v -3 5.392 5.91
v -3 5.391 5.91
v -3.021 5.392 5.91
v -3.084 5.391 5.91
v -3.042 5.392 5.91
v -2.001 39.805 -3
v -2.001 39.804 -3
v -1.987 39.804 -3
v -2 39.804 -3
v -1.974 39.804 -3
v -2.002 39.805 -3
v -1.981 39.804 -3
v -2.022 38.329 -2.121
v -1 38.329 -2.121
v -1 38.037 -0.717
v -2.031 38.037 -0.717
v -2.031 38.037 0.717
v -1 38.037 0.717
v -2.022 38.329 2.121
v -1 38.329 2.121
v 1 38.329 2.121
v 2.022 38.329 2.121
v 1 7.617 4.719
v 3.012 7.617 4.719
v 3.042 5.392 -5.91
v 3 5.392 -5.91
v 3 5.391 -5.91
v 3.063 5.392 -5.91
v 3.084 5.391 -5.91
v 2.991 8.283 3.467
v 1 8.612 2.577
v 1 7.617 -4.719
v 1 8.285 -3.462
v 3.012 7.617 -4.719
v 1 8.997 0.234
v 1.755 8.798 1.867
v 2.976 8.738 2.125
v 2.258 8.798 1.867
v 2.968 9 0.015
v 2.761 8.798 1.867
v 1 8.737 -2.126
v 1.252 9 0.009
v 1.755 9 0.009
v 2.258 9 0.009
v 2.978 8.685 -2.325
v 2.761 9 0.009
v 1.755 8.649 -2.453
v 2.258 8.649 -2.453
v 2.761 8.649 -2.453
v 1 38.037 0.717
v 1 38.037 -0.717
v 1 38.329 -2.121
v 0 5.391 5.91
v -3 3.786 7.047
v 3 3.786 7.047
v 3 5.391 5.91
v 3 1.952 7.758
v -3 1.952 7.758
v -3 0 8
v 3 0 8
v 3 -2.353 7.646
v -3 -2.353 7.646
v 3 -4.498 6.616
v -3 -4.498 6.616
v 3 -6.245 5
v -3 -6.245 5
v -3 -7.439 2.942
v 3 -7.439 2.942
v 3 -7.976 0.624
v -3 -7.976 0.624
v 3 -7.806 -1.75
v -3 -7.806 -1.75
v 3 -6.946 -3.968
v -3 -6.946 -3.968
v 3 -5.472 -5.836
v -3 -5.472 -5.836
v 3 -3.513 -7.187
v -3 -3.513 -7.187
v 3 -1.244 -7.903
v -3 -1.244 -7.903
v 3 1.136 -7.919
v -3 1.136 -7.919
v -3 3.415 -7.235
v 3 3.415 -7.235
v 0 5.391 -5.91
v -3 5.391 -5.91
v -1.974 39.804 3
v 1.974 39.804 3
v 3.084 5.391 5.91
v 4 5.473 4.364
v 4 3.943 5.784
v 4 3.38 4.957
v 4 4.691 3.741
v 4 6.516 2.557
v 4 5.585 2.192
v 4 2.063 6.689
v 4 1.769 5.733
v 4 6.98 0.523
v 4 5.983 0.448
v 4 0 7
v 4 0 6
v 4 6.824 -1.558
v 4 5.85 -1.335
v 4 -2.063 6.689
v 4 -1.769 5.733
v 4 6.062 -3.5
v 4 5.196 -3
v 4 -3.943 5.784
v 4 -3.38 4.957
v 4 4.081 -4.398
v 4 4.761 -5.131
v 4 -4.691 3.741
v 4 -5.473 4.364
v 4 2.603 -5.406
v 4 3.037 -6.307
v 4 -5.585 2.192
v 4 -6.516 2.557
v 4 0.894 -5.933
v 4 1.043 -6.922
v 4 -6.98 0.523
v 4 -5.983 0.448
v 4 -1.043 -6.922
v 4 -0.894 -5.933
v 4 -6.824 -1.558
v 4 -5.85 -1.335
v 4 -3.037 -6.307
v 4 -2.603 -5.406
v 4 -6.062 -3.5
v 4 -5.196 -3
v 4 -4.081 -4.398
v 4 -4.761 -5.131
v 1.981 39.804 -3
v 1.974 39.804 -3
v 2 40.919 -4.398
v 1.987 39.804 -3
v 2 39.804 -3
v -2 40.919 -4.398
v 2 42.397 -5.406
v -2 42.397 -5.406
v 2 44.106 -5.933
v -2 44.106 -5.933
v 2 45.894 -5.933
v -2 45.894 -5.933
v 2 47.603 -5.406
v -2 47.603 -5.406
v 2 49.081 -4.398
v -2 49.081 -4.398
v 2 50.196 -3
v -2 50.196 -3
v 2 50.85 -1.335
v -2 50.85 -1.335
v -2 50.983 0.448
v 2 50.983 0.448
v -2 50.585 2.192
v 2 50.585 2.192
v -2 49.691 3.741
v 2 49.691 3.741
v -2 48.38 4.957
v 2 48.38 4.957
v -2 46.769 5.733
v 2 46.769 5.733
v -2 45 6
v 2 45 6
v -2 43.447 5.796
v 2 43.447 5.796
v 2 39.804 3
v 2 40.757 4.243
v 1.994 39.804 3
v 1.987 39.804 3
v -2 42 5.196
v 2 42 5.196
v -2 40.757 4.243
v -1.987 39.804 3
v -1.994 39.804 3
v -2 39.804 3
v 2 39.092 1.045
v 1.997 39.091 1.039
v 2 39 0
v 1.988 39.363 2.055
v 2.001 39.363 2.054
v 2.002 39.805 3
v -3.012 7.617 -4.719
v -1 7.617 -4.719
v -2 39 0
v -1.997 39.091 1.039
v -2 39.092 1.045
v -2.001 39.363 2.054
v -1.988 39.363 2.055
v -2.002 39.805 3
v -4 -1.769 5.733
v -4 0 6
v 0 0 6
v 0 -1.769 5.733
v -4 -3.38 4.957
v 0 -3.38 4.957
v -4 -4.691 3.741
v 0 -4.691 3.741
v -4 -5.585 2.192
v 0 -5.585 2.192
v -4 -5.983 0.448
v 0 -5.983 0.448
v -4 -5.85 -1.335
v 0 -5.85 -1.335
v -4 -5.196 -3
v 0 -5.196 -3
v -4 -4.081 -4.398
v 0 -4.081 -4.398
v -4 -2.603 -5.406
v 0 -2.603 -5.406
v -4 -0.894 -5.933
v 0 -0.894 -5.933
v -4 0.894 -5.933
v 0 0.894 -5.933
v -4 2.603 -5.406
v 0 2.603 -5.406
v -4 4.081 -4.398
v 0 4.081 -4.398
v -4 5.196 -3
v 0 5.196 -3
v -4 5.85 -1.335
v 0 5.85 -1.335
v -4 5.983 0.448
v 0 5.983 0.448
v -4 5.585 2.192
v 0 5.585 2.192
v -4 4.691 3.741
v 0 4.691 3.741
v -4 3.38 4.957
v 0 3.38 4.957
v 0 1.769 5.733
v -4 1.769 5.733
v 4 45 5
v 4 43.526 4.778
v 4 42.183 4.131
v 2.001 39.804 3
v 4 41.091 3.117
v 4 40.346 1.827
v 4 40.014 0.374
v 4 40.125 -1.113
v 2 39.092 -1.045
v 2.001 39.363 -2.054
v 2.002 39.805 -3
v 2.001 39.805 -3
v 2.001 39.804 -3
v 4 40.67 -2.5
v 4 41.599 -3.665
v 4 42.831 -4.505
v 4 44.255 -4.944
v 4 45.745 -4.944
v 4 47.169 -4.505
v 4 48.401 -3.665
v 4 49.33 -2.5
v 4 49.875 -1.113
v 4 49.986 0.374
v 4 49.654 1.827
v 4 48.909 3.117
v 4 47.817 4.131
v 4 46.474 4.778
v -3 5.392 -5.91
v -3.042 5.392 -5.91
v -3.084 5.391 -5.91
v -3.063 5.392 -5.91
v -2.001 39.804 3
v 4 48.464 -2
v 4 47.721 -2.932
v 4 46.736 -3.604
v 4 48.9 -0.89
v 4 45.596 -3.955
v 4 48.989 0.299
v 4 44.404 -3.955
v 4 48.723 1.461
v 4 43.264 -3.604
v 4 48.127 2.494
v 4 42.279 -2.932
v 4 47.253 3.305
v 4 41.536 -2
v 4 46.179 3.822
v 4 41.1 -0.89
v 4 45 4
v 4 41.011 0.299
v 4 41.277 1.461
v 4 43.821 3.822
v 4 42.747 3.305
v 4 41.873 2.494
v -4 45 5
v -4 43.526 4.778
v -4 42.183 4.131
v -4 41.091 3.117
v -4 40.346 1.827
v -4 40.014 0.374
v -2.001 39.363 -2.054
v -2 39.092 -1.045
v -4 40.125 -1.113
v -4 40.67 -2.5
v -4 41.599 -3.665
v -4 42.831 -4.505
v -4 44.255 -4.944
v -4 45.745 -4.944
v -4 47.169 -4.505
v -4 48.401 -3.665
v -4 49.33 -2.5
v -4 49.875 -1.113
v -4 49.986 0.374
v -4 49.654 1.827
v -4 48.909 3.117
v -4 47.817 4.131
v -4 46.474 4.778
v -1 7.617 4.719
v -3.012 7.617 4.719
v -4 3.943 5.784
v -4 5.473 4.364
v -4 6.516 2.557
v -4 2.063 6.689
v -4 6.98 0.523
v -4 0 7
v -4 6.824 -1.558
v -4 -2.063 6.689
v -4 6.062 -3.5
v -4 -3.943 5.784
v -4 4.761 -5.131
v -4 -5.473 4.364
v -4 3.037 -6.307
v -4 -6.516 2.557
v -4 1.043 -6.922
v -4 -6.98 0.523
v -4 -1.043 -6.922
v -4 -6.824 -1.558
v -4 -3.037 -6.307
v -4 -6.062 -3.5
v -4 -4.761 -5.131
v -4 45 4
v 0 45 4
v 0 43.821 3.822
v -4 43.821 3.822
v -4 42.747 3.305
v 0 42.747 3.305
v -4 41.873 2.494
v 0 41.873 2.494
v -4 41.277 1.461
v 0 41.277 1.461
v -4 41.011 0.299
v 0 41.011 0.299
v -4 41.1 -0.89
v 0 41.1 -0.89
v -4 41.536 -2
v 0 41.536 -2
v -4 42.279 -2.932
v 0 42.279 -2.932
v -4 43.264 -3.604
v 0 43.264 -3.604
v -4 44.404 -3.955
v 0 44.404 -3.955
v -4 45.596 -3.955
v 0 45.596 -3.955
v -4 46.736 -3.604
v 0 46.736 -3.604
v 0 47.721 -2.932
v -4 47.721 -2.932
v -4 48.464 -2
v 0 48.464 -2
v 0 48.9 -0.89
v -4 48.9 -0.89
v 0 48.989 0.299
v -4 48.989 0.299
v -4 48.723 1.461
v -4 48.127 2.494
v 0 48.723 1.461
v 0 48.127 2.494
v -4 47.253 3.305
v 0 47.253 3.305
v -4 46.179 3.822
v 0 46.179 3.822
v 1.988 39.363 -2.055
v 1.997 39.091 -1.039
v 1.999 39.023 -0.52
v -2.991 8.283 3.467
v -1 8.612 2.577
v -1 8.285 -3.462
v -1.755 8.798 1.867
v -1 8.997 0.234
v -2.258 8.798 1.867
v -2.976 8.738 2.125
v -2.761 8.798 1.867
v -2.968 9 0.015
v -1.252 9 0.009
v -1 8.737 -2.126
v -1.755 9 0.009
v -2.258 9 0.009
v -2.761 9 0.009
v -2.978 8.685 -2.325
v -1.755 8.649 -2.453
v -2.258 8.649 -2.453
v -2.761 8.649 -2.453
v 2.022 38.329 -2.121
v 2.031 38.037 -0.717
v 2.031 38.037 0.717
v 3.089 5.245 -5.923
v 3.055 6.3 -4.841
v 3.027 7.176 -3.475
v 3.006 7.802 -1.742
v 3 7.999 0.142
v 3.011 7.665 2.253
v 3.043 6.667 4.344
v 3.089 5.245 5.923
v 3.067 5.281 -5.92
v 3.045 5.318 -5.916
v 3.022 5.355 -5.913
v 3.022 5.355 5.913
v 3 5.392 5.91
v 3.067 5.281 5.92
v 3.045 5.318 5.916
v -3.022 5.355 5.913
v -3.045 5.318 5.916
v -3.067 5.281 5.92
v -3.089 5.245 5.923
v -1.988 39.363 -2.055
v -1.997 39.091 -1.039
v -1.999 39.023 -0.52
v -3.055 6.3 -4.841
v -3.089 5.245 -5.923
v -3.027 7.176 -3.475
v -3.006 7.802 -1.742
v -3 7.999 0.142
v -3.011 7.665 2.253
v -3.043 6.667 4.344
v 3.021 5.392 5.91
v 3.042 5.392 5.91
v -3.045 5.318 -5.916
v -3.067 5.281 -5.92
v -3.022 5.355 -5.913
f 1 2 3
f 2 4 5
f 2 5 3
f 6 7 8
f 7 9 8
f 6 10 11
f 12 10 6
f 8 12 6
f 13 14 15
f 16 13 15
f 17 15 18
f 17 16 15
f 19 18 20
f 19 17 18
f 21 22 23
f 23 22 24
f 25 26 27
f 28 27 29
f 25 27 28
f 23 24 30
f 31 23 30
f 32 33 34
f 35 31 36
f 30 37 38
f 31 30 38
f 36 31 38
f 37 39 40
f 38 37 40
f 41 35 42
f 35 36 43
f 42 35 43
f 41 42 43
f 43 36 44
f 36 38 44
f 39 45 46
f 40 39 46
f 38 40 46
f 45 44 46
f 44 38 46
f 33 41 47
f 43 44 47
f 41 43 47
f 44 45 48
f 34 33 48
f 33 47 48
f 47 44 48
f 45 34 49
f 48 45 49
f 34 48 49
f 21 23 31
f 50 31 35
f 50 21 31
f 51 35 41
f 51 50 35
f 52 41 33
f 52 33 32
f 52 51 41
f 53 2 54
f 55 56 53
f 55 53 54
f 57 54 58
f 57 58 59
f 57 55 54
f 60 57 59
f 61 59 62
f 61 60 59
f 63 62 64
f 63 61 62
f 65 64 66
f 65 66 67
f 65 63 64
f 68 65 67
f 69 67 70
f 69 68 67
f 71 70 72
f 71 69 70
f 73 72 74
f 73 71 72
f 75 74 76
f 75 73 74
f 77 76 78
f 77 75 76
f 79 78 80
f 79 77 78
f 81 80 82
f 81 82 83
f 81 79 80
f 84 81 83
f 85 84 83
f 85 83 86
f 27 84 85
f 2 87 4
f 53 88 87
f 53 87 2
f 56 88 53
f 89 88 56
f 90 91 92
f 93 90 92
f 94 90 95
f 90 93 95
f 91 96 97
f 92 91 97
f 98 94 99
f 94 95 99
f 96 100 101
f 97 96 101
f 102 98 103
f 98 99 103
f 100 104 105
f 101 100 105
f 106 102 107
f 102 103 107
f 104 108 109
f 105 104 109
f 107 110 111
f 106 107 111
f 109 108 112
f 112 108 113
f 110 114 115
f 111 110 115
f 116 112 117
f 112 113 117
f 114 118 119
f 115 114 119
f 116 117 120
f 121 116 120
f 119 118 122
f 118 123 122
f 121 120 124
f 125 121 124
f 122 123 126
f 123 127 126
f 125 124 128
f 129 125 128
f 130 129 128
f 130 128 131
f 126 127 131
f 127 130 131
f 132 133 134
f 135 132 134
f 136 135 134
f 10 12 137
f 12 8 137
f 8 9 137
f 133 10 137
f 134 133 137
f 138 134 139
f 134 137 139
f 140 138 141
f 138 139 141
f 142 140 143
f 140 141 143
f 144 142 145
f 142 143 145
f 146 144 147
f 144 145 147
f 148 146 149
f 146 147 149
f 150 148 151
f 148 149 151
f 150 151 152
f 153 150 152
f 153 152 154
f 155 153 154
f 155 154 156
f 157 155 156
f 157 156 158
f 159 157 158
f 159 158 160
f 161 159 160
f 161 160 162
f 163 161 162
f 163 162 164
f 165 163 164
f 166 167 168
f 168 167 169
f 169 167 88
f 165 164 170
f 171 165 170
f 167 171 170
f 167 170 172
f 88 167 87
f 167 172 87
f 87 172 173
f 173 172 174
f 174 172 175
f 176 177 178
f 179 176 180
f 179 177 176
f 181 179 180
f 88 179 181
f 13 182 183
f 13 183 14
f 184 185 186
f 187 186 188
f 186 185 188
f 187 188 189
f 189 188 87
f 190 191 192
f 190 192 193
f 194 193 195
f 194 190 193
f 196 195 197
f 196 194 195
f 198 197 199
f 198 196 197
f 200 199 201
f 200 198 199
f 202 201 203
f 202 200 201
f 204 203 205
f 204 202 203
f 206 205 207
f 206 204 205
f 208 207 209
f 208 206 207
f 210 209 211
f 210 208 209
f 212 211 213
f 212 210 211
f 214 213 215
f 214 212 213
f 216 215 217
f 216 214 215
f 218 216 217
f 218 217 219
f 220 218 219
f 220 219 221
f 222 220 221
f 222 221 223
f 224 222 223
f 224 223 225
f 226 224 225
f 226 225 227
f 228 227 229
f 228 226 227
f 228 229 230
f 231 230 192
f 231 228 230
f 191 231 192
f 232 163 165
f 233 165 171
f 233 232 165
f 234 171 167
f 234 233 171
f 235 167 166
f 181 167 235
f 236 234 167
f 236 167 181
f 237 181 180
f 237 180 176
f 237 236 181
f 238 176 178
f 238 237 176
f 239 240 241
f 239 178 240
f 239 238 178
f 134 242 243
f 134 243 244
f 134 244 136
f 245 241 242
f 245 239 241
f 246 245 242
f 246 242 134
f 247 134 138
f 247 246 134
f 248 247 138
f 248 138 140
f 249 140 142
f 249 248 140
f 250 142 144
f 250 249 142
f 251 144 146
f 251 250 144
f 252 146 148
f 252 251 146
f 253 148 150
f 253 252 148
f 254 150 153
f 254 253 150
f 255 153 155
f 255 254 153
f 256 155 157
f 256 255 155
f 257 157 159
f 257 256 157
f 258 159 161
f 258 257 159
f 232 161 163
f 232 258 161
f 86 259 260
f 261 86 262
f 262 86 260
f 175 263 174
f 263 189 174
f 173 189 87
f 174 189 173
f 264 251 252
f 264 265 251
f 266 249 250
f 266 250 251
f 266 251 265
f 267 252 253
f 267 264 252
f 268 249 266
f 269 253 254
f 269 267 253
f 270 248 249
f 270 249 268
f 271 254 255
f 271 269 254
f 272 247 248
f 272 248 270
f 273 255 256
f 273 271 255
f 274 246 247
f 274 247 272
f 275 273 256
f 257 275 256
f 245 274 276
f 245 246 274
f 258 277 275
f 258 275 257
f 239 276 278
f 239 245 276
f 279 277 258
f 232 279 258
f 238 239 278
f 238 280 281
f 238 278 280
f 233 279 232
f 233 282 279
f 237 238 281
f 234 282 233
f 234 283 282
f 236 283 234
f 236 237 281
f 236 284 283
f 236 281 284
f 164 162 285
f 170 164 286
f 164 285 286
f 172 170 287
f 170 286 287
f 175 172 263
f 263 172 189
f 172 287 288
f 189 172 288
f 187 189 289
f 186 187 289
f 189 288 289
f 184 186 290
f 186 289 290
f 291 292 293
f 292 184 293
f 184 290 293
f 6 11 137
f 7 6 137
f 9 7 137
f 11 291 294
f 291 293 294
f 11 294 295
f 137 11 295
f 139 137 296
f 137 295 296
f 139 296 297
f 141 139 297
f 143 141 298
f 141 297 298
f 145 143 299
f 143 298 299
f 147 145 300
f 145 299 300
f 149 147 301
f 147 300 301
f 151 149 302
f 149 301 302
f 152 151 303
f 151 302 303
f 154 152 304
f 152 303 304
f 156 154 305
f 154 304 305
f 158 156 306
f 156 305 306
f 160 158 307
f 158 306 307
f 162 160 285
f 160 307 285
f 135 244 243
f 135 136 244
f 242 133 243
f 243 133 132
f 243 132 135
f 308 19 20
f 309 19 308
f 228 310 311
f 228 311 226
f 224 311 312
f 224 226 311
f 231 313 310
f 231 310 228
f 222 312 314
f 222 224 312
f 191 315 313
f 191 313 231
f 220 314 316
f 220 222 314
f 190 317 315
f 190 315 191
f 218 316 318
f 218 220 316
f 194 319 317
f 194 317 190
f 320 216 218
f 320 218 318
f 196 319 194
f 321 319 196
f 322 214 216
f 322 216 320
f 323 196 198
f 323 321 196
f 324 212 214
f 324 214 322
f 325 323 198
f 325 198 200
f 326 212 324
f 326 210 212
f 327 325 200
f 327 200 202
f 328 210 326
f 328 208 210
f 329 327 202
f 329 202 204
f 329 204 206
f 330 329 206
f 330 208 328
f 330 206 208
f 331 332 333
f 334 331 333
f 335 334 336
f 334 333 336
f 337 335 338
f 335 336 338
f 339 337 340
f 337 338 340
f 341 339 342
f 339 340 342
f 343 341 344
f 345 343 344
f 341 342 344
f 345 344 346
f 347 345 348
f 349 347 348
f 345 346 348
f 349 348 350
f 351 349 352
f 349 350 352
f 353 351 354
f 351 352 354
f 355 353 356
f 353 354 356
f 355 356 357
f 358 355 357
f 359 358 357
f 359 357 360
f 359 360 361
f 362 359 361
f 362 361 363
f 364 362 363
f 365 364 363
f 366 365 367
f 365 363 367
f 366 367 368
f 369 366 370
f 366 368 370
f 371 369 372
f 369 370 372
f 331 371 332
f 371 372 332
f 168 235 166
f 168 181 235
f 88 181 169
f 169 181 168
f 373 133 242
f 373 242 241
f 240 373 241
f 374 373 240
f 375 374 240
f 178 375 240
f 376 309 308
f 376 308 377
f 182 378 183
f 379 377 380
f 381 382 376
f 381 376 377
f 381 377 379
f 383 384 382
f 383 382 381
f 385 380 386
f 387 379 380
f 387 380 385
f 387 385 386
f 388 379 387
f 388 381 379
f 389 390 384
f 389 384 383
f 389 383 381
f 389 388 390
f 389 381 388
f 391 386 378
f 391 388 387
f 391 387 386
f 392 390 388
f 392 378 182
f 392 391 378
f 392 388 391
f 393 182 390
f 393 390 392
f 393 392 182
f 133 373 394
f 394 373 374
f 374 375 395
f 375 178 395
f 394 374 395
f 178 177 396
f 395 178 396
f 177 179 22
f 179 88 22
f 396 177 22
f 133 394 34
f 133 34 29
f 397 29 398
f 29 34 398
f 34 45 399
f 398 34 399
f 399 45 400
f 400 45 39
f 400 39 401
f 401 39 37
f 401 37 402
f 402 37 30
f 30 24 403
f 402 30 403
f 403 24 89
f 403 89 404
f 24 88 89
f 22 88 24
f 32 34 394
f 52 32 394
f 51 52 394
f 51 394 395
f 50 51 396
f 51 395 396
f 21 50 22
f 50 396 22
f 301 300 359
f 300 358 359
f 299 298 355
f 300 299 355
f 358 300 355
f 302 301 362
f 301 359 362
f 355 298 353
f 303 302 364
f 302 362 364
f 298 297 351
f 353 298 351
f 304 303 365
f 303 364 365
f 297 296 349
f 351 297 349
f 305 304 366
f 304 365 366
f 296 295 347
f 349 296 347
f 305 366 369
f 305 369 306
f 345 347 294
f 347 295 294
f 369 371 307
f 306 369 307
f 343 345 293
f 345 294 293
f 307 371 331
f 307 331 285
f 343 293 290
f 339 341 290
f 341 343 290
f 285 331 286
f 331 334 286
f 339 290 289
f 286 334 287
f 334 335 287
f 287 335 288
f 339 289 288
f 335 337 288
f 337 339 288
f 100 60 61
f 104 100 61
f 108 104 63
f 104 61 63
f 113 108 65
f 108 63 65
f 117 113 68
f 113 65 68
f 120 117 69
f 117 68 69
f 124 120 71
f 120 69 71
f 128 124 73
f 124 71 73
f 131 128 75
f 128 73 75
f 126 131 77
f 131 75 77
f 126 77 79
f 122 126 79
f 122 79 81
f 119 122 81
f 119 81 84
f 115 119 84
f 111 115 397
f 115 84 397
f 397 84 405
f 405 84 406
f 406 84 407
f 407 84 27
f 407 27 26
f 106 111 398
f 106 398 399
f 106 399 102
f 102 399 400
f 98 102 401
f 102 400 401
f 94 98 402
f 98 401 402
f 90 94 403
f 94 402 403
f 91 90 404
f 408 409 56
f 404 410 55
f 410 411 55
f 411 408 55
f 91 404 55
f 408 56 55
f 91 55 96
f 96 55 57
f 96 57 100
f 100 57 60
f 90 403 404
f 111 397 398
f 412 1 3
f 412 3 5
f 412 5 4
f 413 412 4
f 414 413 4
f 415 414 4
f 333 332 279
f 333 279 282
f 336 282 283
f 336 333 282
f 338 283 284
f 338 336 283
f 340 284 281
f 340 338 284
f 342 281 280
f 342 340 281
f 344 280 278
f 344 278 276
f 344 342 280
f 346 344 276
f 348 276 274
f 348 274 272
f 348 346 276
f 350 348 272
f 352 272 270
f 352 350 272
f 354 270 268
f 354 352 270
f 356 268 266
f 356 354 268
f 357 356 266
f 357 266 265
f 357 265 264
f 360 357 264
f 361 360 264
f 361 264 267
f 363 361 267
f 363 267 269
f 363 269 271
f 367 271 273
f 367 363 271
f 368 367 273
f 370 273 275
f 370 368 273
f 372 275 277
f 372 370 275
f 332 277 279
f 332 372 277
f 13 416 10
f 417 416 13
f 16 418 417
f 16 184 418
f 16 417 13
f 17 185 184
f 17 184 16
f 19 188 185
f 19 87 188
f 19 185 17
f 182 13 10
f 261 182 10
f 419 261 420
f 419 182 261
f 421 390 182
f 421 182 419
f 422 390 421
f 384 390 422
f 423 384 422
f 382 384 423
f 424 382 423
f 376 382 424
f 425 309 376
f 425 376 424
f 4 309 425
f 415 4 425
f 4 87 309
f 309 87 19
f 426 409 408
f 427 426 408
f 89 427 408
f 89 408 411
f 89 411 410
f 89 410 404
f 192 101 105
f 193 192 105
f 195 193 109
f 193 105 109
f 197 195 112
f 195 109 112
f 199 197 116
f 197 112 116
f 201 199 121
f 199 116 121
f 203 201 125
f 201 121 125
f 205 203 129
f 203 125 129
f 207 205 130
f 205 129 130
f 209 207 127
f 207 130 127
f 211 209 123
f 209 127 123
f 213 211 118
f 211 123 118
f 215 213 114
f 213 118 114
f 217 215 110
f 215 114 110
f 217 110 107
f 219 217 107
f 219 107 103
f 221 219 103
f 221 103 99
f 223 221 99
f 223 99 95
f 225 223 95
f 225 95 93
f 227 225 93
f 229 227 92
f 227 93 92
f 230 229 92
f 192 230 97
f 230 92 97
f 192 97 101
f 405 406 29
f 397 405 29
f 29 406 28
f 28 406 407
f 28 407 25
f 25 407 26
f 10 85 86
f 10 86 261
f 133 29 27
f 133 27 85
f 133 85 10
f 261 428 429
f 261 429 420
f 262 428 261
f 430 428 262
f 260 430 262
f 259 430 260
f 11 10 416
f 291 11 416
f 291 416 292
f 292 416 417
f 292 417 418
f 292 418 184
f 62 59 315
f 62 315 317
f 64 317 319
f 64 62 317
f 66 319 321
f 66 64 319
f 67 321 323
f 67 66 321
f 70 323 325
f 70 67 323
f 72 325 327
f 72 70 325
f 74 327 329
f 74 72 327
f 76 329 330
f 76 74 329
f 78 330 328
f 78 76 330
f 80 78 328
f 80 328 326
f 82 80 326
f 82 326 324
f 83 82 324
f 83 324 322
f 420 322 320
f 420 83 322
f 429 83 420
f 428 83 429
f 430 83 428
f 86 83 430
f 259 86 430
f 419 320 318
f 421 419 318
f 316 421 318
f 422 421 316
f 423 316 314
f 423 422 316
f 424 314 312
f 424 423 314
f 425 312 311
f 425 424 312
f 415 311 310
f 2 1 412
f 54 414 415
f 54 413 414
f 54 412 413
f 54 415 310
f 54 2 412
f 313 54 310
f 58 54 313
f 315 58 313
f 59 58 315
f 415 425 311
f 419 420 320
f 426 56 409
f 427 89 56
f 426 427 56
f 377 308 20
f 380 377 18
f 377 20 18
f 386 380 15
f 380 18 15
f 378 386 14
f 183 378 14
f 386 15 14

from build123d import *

# Parameters (mm, degrees)
BOSS_EXTRU_1_START      = -2.0000001
BOSS_EXTRU_1_DEPTH      = 2.0000001
BOSS_EXTRU_1_START_2    = 2.0000001
BOSS_EXTRU_1_2_DEPTH    = 1.088880676
BOSS_EXTRU_1_START_3    = 3.256370695
BOSS_EXTRU_1_3_DEPTH    = 1.743629305
BOSS_EXTRU_1_START_4    = 3.172268194
BOSS_EXTRU_1_4_DEPTH    = 0.084102501
ENL_V_MAT_EXTRU_1_DEPTH = 9


with BuildPart() as part:
    # Esquisse2 → Révolution1 (revolve)
    with BuildSketch(Plane.XY, mode=Mode.PRIVATE) as r_volution1_sk:
        Polygon((2.4e-16, 6), (4, 6), (4, 7), (2.9999999999999996, 8), (-1.8e-16, 8), align=None)
    revolve(r_volution1_sk.sketch.rotate(Axis((0, 0, 0), (1, 0, 0)), 90), axis=Axis((0, 0, 0), (1, 0, 0)))



with BuildPart() as body_2:
    # Esquisse3 → Révolution2 (revolve)
    with BuildSketch(Plane.XY, mode=Mode.PRIVATE) as r_volution2_sk:
        Polygon((0, 48.99999999999999), (4.01e-15, 51), (2, 51), (4, 49.99999999999999), (4, 48.99999999999999), align=None)
    revolve(r_volution2_sk.sketch.rotate(Axis((0, 45, 0), (1, 0, 0)), 90), axis=Axis((0, 45, 0), (1, 0, 0)))


with BuildPart() as part_1:
    add(part.part)

    add(body_2.part)  # Boss.-Extru.1 merges body 2
    # Boss.-Extru.1: read off the stored shape, not the designer's step
    # Boss.-Extru.1 outline → Boss.-Extru.1 (add)
    with BuildSketch(Plane.ZY.offset(BOSS_EXTRU_1_START)):
        with BuildLine():
            ThreePointArc((-5.910337632, 5.39146632), (0, 8), (5.910337632, 5.39146632))
            Line((5.910337632, 5.39146632), (3, 39.803847577))
            ThreePointArc((3, 39.803847577), (0, 39), (-3, 39.803847577))
            Line((-3, 39.803847577), (-5.910337632, 5.39146632))
        make_face()
    extrude(amount=BOSS_EXTRU_1_DEPTH)

    # Boss.-Extru.1 2 outline → Boss.-Extru.1 2 (add)
    with BuildSketch(Plane.YZ.offset(BOSS_EXTRU_1_START_2)):
        with BuildLine():
            ThreePointArc((39.803847577, -3), (39, 0), (39.803847577, 3))
            Line((39.803847577, 3), (5.39146632, 5.910337632))
            ThreePointArc((5.39146632, 5.910337632), (8, 0), (5.39146632, -5.910337632))
            Line((5.39146632, -5.910337632), (39.803847577, -3))
        make_face()
    extrude(amount=BOSS_EXTRU_1_2_DEPTH)

    # Boss.-Extru.1 3 outline → Boss.-Extru.1 3 (cut)
    with BuildSketch(Plane(origin=(0, 0, 0), x_dir=(-0.032241294010957995, 0.9994801143396995, 0), z_dir=(0.9994801143396996, 0.032241294010957995, 0)).offset(BOSS_EXTRU_1_START_3)):
        with BuildLine():
            add(Edge.make_bspline(
                [(5.142379796, -5.922750354), (12.17659734275441, -2.94e-15), (5.142379796, 5.922750354)],
                knots=[5.412727934893089, 5.412727934893089, 5.412727934893089, 7.153642679466084, 7.153642679466084, 7.153642679466084], degree=2, weights=[1, 0.6444768969331849, 1]))
            Line((5.142379796, -5.922750354), (39.719507575, -3))
            add(Edge.make_bspline(
                [(39.719507575, -3), (39.4087631690425, -2.4620547166991407), (39.162117173894764, -1.8742292038542891), (38.995705810616975, -1.2534964190781404), (38.91524187122639, -0.6211657082460426), (38.91524187122635, 0.6211657082460548), (38.99570581061705, 1.2534964190781592), (39.16211717389469, 1.8742292038543251), (39.40876316904256, 2.46205471669918), (39.719507575, 3)],
                knots=[3.141592653589793, 3.141592653589793, 3.141592653589793, 3.141592653589793, 3.141592653589793, 3.141592653589793, 3.665191429188086, 3.665191429188086, 3.665191429188086, 3.665191429188086, 4.188790204786387, 4.188790204786387, 4.188790204786387, 4.188790204786387, 4.188790204786387, 4.188790204786387], degree=5, weights=[1, 0.9999999999999991, 0.9995355802743678, 0.9995355802743658, 1.0000000000000004, 0.9999999999999986, 0.9995355802743691, 0.9995355802743657, 1.0000000000000004, 1]))
            Line((39.719507575, 3), (5.142379796, 5.922750354))
        make_face()
    extrude(amount=BOSS_EXTRU_1_3_DEPTH, mode=Mode.SUBTRACT)

    # Boss.-Extru.1 4 outline → Boss.-Extru.1 4 (add)
    with BuildSketch(Plane(origin=(0, 0, 0), x_dir=(-0.032241294010957995, 0.9994801143396995, 0), z_dir=(0.9994801143396996, 0.032241294010957995, 0)).offset(BOSS_EXTRU_1_START_4)):
        with BuildLine():
            add(Edge.make_bspline(
                [(5.142379796, -5.922750354), (12.17659734275441, -2.94e-15), (5.142379796, 5.922750354)],
                knots=[5.412727934893089, 5.412727934893089, 5.412727934893089, 7.153642679466084, 7.153642679466084, 7.153642679466084], degree=2, weights=[1, 0.6444768969331849, 1]))
            Line((5.142379796, -5.922750354), (39.719507575, -3))
            add(Edge.make_bspline(
                [(39.719507575, -3), (39.4087631690425, -2.4620547166991407), (39.162117173894764, -1.8742292038542891), (38.995705810616975, -1.2534964190781404), (38.91524187122639, -0.6211657082460426), (38.91524187122635, 0.6211657082460548), (38.99570581061705, 1.2534964190781592), (39.16211717389469, 1.8742292038543251), (39.40876316904256, 2.46205471669918), (39.719507575, 3)],
                knots=[3.141592653589793, 3.141592653589793, 3.141592653589793, 3.141592653589793, 3.141592653589793, 3.141592653589793, 3.665191429188086, 3.665191429188086, 3.665191429188086, 3.665191429188086, 4.188790204786387, 4.188790204786387, 4.188790204786387, 4.188790204786387, 4.188790204786387, 4.188790204786387], degree=5, weights=[1, 0.9999999999999991, 0.9995355802743678, 0.9995355802743658, 1.0000000000000004, 0.9999999999999986, 0.9995355802743691, 0.9995355802743657, 1.0000000000000004, 1]))
            Line((39.719507575, 3), (5.142379796, 5.922750354))
        make_face()
    extrude(amount=BOSS_EXTRU_1_4_DEPTH)

    # Esquisse6 → Enlèv. mat.-Extru.1 (cut)
    with BuildSketch(Plane(origin=(10, 0, 0), x_dir=(0, 0, -1), z_dir=(1, 0, 0))):
        with BuildLine():
            Line((4.7185213239125305, 7.617327682628814), (2.121151849996758, 38.329114389434075))
            ThreePointArc((2.121151849996758, 38.329114389434075), (1.0732662125583343, 38.082767920838506), (1.29e-15, 37.999999999999986))
            ThreePointArc((1.29e-15, 37.999999999999986), (-1.0732662125583345, 38.08276792083852), (-2.12115184999676, 38.32911438943409))
            Line((-2.12115184999676, 38.32911438943409), (-4.7185213239117045, 7.617327682628745))
            add(Edge.make_bspline(
                [(-4.7185213239117045, 7.617327682628745), (-4.011984255343939, 8.070257956932029), (-3.261550361542695, 8.410740591888102), (-2.2711967086518885, 8.702341470829111), (-2.0704598676815316, 8.75383204519997), (-1.6635130029960632, 8.842792898029453), (-1.456446032141917, 8.880350619711338), (-0.8364313606849374, 8.969908948596256), (-0.00941084225722518, 9.029205401703816), (0.818259414860091, 8.971660679545408), (1.646265253396883, 8.853769039344968), (2.0556953800959668, 8.76494999754429), (2.850690444417165, 8.532525136333405), (3.23863975479659, 8.388601680371798), (3.9952504696443585, 8.044777052176354), (4.365252036804486, 7.8437933023834185), (4.7185213239125305, 7.617327682628814)],
                knots=[0, 0, 0, 0, 0.24999999999999978, 0.24999999999999978, 0.31249999999999983, 0.31249999999999983, 0.3749999999999999, 0.3749999999999999, 0.4999999999999999, 0.6249999999999999, 0.6249999999999999, 0.7499999999999999, 0.7499999999999999, 0.8749999999999999, 0.8749999999999999, 1, 1, 1, 1], degree=3))
        make_face()
    extrude(amount=-ENL_V_MAT_EXTRU_1_DEPTH, mode=Mode.SUBTRACT)

    # Symétrie10: part across plane


with BuildPart() as part_2:
    add(part_1.part)
    add(part_1.part.mirror(Plane(origin=(0, 0, 0), x_dir=(0, 0, 1), z_dir=(1, 0, 0))))


solid = part_2.part
